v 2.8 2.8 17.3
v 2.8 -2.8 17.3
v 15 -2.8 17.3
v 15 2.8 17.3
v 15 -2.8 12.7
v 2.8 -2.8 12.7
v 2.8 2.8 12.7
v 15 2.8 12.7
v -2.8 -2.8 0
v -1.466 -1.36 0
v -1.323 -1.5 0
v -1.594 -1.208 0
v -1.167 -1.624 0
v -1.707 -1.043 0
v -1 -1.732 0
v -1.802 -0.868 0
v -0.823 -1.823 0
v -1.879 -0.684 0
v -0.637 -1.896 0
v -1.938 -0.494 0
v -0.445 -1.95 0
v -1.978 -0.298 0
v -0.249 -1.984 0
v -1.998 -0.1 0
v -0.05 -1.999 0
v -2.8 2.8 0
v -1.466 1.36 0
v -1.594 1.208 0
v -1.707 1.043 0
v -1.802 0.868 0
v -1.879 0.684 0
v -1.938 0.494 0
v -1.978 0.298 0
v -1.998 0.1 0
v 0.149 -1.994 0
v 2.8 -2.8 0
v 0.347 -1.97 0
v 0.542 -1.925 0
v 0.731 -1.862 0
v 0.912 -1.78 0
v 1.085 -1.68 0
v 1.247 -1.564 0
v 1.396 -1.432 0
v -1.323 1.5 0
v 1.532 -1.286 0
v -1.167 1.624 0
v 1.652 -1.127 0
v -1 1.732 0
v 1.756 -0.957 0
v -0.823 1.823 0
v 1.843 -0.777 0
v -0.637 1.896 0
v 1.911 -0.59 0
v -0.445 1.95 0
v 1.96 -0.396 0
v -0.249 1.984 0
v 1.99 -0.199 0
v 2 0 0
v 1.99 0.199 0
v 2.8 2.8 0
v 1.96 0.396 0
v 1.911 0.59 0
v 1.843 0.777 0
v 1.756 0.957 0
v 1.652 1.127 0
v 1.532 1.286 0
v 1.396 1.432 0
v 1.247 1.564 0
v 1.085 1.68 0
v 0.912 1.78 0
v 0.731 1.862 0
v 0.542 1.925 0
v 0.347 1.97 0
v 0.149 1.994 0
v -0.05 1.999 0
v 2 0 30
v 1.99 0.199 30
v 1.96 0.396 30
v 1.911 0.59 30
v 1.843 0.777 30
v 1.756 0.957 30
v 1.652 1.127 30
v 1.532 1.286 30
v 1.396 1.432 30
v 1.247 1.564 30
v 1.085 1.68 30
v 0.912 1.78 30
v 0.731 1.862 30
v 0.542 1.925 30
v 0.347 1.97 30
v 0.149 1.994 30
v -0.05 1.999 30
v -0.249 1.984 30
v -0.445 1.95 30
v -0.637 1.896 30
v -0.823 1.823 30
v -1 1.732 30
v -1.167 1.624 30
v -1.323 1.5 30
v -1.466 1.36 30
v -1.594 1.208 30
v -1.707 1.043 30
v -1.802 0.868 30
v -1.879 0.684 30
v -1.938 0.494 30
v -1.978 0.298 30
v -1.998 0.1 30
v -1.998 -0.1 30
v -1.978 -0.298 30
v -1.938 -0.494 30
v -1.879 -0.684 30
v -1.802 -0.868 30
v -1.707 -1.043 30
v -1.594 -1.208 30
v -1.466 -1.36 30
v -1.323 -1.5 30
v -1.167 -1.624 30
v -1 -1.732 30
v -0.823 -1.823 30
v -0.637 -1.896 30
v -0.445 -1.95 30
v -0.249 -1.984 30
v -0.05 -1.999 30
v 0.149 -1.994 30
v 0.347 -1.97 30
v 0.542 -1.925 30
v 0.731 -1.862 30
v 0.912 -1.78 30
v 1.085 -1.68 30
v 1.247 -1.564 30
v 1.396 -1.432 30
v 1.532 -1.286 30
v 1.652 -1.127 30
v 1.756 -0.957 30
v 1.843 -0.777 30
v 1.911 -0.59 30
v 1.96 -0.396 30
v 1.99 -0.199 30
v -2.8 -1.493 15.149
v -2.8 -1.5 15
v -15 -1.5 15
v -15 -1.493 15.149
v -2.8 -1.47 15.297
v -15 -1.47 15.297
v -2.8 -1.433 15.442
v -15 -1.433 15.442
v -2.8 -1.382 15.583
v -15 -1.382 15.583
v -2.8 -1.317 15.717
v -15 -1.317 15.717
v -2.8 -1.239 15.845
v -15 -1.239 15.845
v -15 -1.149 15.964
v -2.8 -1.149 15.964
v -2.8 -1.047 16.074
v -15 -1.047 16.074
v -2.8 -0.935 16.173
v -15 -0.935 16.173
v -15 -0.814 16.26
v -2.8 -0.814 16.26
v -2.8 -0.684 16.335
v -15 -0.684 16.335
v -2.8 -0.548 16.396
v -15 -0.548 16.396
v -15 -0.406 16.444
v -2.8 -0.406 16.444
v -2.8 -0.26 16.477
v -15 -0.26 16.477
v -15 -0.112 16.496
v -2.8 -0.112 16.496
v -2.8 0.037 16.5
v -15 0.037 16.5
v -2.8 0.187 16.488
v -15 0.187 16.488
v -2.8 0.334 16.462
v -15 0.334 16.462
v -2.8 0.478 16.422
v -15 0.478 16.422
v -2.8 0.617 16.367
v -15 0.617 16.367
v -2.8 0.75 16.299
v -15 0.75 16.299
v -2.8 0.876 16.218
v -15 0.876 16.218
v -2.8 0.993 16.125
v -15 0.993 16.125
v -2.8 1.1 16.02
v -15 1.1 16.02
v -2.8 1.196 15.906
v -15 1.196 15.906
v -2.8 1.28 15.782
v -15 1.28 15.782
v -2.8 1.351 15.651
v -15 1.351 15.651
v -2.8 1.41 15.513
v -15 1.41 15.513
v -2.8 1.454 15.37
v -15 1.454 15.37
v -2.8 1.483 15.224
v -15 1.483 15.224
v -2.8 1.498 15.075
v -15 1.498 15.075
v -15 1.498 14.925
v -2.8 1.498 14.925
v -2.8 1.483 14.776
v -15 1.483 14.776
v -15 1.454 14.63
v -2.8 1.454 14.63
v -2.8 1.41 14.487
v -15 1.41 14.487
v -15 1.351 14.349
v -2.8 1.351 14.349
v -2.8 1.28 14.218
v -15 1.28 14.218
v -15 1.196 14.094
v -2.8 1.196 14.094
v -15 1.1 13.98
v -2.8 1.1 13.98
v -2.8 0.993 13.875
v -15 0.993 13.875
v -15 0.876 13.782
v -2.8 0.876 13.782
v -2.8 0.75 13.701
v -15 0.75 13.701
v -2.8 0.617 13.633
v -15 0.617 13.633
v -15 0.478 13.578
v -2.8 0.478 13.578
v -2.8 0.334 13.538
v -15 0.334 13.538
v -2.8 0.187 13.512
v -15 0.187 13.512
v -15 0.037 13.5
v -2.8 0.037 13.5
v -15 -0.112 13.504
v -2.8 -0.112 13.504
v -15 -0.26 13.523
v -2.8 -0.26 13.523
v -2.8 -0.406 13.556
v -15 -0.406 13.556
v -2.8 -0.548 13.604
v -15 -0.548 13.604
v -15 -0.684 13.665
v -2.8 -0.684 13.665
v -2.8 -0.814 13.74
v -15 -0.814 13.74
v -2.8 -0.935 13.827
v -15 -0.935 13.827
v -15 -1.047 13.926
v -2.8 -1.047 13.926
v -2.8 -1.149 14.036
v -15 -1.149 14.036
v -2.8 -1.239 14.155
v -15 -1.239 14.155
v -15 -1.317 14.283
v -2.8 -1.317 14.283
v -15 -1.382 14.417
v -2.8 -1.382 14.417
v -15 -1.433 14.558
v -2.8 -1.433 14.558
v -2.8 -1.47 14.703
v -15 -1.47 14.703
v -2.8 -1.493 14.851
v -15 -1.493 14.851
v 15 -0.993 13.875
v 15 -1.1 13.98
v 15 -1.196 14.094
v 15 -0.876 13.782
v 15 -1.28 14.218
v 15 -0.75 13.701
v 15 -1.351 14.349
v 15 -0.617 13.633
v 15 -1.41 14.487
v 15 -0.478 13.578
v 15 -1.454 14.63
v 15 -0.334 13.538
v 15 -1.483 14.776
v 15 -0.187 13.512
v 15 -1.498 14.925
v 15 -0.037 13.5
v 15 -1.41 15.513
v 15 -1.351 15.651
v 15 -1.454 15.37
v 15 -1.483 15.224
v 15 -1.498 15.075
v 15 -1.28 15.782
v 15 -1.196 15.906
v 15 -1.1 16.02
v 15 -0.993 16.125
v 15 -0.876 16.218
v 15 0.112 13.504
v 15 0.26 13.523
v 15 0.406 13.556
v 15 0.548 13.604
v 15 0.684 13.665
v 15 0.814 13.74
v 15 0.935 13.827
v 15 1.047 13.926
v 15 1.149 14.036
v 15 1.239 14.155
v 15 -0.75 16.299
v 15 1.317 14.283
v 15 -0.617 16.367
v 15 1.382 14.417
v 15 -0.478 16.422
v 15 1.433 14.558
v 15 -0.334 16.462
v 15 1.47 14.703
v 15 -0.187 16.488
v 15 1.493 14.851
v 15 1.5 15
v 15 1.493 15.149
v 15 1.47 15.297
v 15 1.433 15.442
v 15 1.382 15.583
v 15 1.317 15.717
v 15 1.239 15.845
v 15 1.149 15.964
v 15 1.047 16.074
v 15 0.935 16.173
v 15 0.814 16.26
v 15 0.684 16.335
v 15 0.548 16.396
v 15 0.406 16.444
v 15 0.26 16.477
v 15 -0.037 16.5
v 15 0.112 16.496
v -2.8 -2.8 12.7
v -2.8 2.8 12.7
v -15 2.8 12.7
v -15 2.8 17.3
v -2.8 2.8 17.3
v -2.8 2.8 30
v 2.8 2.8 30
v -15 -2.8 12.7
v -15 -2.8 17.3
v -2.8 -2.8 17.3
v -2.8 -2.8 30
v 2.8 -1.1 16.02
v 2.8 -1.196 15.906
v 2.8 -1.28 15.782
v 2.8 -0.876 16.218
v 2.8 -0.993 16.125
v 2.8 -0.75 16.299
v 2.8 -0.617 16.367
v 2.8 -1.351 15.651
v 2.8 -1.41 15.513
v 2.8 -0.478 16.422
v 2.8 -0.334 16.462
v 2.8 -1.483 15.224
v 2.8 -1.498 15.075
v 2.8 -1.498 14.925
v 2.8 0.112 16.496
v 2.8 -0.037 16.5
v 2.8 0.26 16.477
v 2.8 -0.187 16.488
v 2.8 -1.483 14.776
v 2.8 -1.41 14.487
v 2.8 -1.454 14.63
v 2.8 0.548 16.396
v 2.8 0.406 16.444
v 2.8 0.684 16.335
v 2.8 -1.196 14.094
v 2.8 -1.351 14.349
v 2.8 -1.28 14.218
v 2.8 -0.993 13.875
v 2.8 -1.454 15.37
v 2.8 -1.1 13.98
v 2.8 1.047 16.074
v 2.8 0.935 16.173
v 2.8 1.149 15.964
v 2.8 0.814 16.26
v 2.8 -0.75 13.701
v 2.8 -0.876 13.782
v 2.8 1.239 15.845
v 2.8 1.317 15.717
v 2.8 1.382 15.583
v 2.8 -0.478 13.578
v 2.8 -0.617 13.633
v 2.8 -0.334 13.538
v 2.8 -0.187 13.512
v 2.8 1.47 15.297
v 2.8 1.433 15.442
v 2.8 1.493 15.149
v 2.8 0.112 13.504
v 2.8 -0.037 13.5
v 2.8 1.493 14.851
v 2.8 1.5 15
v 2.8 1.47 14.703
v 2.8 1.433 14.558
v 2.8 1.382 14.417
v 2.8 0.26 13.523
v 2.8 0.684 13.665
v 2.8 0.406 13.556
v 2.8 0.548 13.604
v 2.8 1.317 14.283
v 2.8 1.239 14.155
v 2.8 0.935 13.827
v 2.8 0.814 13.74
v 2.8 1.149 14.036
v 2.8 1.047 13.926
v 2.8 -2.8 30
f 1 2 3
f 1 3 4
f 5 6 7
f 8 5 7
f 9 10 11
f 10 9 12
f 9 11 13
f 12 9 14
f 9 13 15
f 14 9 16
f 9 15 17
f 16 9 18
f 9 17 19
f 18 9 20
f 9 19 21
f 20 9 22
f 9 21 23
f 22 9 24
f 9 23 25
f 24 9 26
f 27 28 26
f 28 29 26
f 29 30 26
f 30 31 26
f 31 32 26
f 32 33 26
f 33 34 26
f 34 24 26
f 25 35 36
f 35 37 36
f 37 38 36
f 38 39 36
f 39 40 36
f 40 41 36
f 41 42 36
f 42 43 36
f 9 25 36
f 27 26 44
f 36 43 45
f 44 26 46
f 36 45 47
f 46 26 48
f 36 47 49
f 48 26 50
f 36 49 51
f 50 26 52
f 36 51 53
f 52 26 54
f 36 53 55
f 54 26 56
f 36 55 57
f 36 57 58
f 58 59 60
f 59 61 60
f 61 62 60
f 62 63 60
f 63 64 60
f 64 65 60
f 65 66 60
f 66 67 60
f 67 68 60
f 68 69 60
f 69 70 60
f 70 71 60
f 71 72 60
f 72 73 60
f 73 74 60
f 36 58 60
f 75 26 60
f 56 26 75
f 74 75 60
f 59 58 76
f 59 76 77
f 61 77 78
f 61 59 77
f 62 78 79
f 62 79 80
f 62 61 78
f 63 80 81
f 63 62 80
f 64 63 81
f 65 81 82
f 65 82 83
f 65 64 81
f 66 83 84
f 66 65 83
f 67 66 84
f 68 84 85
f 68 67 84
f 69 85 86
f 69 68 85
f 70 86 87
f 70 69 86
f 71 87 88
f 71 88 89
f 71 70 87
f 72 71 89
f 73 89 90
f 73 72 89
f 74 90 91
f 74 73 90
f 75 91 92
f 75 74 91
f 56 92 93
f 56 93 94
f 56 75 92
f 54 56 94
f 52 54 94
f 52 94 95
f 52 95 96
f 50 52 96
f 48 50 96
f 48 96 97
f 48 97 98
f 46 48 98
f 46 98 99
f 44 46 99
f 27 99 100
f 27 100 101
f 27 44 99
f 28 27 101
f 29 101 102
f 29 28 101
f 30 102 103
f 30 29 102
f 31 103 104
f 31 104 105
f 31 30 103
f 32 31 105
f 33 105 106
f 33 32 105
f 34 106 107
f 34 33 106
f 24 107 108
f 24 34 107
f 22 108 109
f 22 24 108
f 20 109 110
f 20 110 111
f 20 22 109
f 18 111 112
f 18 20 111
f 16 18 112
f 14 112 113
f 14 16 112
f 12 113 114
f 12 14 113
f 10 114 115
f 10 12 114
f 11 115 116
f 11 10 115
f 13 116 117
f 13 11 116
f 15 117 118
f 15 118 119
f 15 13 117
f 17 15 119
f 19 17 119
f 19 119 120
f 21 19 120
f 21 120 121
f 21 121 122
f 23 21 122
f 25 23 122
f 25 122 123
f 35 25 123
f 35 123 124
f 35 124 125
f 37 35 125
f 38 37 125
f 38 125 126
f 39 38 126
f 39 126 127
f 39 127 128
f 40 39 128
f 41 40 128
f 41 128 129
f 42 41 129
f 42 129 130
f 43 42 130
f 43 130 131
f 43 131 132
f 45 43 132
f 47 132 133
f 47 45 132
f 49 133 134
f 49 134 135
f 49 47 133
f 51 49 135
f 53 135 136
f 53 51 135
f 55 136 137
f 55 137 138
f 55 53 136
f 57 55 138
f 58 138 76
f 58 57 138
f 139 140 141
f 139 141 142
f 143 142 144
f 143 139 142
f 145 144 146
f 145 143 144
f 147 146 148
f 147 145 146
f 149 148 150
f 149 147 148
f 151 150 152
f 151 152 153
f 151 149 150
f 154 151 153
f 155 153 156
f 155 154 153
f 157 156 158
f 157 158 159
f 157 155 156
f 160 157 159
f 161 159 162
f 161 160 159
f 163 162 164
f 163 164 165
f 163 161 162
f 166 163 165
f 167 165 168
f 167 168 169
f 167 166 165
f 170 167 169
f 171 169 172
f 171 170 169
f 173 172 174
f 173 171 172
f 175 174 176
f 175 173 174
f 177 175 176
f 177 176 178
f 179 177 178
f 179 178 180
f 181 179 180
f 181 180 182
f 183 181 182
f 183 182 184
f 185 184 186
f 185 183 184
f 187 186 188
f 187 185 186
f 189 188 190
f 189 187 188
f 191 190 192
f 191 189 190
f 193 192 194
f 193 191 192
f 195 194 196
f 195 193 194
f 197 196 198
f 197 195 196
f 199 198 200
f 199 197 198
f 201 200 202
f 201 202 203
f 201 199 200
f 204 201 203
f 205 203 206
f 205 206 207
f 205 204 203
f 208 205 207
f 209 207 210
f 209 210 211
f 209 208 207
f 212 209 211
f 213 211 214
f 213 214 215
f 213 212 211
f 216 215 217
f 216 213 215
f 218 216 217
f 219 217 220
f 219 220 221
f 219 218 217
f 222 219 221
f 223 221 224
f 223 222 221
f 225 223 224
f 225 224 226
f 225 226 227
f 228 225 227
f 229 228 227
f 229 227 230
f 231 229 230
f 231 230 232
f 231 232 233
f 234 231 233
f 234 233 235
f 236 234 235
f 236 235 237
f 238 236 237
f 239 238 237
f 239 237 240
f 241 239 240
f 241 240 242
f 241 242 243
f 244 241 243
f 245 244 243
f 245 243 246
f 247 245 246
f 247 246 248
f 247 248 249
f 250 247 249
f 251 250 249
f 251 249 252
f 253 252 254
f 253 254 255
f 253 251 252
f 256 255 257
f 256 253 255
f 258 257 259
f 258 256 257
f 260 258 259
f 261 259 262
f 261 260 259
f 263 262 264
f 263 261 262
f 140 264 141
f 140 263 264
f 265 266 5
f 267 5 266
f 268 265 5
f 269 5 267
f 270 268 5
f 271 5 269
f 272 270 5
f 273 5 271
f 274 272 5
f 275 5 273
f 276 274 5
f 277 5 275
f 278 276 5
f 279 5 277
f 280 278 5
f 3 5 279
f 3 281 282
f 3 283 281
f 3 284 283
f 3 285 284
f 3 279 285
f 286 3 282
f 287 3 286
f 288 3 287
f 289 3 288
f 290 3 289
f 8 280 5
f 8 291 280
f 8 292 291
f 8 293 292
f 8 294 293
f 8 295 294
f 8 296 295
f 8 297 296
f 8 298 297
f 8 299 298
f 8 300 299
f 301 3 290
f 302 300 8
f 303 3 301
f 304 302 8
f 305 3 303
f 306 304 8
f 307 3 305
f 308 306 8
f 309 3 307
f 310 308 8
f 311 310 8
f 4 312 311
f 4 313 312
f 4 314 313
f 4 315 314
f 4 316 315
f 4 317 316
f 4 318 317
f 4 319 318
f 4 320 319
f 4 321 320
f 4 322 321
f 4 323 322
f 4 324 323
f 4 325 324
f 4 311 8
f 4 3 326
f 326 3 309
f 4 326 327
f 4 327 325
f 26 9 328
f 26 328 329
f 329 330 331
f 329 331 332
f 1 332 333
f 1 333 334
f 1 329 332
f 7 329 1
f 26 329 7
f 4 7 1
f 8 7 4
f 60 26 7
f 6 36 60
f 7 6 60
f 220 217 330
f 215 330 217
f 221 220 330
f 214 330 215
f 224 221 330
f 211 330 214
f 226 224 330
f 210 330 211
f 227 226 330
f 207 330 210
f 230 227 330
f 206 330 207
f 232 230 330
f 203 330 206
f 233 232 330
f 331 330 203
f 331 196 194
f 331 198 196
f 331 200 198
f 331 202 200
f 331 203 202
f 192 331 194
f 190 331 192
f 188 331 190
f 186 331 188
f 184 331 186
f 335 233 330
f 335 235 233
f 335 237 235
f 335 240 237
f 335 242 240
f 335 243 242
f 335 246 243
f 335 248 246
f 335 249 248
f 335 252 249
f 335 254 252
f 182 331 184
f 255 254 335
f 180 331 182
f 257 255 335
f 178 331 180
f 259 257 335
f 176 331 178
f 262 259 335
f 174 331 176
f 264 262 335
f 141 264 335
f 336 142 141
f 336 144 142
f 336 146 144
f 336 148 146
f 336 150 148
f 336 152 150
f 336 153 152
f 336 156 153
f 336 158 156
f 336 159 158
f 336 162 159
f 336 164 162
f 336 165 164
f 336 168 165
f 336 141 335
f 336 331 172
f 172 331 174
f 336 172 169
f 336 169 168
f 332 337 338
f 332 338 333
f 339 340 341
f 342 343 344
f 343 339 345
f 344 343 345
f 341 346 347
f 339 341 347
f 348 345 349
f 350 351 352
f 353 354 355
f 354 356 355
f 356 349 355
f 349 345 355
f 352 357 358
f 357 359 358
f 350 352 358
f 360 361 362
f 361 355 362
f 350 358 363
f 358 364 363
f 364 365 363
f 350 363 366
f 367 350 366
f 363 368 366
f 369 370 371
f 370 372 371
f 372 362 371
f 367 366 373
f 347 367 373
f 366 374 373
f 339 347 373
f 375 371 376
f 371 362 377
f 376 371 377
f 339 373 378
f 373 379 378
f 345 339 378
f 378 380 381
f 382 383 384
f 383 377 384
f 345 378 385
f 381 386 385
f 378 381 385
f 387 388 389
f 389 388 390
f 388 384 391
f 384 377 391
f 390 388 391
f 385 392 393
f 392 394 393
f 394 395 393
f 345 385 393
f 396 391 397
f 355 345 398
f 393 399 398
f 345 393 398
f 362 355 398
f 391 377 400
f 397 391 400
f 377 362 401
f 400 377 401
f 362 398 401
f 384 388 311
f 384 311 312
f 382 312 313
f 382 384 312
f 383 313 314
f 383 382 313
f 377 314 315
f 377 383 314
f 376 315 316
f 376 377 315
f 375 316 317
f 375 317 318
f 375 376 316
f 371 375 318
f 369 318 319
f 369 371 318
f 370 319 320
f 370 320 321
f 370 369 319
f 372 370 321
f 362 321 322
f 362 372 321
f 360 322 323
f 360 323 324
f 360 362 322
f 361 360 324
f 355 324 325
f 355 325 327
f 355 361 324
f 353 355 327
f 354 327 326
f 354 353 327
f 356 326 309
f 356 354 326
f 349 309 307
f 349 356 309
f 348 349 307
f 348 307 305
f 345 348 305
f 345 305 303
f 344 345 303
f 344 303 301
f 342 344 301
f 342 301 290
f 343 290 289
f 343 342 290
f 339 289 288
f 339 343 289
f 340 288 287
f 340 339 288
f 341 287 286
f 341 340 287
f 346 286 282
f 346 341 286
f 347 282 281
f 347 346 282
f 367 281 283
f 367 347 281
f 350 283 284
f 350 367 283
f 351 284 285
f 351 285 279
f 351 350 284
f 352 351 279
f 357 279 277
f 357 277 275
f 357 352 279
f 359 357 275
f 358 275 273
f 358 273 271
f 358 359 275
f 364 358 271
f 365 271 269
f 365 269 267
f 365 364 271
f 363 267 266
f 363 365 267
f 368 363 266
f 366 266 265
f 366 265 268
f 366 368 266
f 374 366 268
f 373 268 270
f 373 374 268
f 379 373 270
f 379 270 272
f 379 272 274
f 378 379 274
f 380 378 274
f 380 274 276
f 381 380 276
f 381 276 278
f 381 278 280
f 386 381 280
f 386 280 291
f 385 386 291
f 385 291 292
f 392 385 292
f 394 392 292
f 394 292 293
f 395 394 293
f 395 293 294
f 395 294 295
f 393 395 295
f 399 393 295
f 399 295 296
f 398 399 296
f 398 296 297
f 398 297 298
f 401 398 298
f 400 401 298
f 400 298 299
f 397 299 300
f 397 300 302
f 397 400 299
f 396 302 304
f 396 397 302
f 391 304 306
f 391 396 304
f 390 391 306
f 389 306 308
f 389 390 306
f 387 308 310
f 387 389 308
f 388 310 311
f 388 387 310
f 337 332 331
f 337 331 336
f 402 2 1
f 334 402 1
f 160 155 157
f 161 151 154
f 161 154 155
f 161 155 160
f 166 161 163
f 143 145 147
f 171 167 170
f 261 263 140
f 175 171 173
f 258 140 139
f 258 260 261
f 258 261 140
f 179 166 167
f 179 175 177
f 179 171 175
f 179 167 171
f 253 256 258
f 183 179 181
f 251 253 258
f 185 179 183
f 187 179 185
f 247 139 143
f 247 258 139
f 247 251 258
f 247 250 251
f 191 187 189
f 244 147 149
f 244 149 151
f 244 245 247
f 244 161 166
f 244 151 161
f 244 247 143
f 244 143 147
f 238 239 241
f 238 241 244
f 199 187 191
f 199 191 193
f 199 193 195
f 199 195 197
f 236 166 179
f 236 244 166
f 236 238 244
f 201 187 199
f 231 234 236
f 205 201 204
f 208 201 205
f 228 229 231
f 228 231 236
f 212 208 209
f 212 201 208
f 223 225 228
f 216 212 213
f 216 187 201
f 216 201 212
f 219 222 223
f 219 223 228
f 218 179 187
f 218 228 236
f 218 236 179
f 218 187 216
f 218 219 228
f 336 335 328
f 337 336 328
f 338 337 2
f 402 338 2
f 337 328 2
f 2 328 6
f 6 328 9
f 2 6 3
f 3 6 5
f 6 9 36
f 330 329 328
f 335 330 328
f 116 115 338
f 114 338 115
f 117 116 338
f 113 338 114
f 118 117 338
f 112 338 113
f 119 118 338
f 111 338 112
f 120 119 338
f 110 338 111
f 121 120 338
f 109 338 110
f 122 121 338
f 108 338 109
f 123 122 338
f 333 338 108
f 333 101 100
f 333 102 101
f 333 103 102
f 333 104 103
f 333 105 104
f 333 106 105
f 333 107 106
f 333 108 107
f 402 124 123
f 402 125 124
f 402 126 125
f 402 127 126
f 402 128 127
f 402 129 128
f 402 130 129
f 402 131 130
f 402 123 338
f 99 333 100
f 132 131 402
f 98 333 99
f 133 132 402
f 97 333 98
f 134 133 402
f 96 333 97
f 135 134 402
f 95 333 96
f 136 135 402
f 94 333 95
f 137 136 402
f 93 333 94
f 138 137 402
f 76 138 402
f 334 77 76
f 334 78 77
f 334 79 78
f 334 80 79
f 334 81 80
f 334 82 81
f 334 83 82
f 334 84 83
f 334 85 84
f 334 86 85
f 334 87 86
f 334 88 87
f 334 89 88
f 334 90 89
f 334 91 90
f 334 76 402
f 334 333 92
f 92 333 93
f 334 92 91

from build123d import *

# Parameters (mm, degrees)
F0_W     = 5.6
F0_H     = 5.6
F0_R     = 2
F1_DEPTH = 30
F2_W     = 5.6
F2_H     = 4.6
F2_R     = 1.5
F3_DEPTH = 12.2
F4_W     = 5.6
F4_H     = 4.6
F4_R     = 1.5
F5_DEPTH = 12.2


with BuildPart() as f1:
    # F0 (on Top) → F1 (new body)
    with BuildSketch(Plane.XY):
        Rectangle(F0_W, F0_H)
        Circle(F0_R, mode=Mode.SUBTRACT)
    extrude(amount=F1_DEPTH)

    # F2 (on face) → F3 (join)
    with BuildSketch(Plane.YZ.offset(2.8)):
        with Locations((0, 15)):
            Rectangle(F2_W, F2_H)
        with Locations((0, 15)):
            Circle(F2_R, mode=Mode.SUBTRACT)
    extrude(amount=F3_DEPTH)

    # F4 (on face) → F5 (join)
    with BuildSketch(Plane(origin=(-2.8, 0, 0), x_dir=(0, -1, 0), z_dir=(-1, 0, 0))):
        with Locations((0, 15)):
            Rectangle(F4_W, F4_H)
        with Locations((0, 15)):
            Circle(F4_R, mode=Mode.SUBTRACT)
    extrude(amount=F5_DEPTH)


solid = f1.part
